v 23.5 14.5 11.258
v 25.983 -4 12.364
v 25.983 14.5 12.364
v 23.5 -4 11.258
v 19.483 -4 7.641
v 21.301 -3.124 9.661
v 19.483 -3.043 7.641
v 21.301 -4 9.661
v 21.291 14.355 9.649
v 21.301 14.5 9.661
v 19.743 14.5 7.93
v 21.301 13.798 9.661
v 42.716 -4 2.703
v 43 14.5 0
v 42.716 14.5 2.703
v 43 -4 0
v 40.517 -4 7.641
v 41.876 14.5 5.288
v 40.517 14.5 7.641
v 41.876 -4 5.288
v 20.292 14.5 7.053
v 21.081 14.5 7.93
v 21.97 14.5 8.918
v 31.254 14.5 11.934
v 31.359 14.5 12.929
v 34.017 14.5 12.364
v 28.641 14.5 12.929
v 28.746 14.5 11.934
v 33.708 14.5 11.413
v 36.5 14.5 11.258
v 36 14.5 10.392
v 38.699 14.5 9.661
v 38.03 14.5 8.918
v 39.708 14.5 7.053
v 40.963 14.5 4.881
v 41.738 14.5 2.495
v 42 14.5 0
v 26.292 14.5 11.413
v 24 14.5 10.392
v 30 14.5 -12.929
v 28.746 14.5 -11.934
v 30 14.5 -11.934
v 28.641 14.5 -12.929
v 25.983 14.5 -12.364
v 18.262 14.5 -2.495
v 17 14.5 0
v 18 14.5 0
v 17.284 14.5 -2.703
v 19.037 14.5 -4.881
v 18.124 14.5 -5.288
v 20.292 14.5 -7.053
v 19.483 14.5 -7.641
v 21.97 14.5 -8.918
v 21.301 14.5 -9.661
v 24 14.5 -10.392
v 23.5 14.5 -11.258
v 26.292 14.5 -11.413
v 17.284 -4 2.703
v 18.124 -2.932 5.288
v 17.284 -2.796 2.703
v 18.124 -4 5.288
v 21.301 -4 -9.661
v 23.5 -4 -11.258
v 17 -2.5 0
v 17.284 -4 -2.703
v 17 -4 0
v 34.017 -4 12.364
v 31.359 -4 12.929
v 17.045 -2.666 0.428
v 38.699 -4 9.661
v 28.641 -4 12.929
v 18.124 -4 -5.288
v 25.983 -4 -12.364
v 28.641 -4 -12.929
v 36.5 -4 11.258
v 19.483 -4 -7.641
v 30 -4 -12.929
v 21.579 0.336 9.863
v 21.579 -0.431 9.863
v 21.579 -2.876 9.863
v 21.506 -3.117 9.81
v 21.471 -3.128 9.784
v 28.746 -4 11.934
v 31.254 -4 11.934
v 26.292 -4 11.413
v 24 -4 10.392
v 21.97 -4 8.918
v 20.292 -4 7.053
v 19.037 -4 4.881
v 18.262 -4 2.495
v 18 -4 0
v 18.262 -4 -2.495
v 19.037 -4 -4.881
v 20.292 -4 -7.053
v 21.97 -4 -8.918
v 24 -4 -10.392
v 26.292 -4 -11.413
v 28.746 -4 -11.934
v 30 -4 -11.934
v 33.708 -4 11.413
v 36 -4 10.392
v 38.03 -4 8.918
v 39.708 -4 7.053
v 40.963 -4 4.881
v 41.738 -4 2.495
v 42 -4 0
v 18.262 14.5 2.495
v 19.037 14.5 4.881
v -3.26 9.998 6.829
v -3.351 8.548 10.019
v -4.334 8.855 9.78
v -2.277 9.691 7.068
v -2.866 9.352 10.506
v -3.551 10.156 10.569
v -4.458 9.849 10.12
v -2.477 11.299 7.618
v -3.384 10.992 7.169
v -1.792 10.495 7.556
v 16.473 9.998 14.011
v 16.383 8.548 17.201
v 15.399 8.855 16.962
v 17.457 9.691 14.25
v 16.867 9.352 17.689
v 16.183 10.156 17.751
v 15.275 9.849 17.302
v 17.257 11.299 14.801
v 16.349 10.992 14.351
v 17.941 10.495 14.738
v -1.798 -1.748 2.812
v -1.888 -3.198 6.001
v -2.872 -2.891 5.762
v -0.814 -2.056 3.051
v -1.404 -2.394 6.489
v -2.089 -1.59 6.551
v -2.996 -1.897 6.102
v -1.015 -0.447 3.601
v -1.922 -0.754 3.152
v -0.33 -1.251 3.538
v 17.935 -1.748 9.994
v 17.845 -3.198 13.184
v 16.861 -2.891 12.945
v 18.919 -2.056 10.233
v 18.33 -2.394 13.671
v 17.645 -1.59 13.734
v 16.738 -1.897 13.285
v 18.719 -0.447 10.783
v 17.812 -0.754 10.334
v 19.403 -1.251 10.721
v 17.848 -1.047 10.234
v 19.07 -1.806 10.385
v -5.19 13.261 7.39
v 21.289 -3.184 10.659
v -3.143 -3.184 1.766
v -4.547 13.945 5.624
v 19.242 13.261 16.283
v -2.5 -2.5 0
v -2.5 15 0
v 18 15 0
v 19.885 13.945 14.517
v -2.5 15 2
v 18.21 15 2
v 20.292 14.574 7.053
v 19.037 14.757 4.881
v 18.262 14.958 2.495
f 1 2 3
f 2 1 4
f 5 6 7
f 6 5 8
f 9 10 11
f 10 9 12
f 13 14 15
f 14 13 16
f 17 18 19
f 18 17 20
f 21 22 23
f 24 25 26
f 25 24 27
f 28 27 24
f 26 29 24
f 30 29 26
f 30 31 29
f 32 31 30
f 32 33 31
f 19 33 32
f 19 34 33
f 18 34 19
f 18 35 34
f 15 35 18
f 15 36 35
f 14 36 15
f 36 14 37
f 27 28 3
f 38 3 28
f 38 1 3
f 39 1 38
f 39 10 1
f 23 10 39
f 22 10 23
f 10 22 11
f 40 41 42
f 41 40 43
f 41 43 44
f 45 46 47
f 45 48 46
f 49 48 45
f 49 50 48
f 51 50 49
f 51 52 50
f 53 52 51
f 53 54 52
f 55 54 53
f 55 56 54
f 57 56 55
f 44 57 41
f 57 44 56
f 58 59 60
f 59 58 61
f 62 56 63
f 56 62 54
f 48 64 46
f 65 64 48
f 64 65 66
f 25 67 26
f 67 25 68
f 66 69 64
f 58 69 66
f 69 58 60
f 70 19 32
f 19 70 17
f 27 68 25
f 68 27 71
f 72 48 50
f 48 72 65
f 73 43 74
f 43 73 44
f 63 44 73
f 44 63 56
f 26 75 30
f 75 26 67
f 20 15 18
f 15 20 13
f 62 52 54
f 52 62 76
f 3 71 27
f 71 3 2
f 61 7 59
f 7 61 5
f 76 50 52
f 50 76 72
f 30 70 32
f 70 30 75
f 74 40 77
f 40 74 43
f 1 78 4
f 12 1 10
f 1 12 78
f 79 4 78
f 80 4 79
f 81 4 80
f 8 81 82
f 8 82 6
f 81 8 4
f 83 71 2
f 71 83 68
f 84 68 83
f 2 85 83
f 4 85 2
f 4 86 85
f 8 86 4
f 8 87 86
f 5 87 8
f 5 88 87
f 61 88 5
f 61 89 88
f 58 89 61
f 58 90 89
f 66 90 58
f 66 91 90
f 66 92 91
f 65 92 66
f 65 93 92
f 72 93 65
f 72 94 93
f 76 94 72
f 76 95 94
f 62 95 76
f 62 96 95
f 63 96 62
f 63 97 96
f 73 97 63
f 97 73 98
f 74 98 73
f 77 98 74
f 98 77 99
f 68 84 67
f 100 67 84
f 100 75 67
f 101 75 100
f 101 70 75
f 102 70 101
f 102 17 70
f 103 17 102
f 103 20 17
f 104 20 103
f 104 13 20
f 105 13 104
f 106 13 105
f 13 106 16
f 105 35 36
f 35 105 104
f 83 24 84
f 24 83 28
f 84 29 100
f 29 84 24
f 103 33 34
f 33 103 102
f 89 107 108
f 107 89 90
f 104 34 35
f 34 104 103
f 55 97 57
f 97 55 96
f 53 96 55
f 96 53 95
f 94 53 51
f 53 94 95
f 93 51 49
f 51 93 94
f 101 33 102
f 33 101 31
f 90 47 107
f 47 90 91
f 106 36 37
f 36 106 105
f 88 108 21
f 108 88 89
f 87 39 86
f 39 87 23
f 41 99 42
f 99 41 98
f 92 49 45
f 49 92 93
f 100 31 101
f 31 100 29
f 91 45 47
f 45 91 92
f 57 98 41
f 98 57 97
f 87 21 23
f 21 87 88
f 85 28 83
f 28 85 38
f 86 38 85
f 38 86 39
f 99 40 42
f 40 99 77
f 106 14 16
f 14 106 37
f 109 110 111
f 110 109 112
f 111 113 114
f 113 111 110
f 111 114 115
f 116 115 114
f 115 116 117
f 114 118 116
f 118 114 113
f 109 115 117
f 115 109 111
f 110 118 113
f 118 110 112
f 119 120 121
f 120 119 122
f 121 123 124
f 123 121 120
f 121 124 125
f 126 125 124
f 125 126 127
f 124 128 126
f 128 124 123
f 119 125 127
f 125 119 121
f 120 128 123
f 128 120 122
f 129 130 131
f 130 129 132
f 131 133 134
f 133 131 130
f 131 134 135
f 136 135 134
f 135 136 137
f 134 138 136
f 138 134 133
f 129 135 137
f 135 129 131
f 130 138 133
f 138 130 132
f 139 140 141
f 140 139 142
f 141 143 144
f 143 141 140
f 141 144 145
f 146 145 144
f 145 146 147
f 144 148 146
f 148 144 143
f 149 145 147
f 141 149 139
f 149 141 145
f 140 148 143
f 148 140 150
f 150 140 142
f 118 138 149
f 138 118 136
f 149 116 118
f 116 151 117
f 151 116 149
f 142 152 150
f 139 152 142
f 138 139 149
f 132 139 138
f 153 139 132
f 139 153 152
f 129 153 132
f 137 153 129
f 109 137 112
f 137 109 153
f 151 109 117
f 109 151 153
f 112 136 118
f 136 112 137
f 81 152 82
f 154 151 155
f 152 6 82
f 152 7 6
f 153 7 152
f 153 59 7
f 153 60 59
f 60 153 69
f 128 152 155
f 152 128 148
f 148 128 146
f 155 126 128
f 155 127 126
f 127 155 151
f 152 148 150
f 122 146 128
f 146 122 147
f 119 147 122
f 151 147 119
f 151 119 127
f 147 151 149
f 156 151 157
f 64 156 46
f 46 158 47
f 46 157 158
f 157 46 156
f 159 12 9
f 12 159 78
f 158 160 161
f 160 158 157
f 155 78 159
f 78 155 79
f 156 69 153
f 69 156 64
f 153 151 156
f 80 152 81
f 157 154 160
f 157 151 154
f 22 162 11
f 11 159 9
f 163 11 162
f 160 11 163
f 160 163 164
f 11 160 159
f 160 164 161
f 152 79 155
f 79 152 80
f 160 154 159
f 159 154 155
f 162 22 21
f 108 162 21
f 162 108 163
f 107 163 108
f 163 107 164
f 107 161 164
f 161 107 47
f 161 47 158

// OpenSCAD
wall_thickness = 6.2;
thickness = 2;
height_offset = 60;

right_rotation = 20;
down_rotation  = 20;


module camera_mount(){
rotate([down_rotation,-right_rotation,0])
translate([0,0,thickness]){

    cylinder(h=5, d=1.8);
    translate([21,0,0]) cylinder(h=5, d=1.8);

    translate([0,12.5,0]) {
        cylinder(h=5, d=1.8);
        translate([21,0,0]) cylinder(h=5, d=1.8);    
        }
}

    
    
translate([-5/2,-5/2,0]){
    hull() {
    rotate([down_rotation,-right_rotation,0]) cube([21+5, 12.5+5, 2]);
    cube([21+5, 12.5+5, 2]);
    }
    }
    
}
translate([30,-4,0])
rotate([-90,0,0])
difference(){
cylinder(12.5+6, 26/2, 26/2);
    
cylinder(12.5+6, 24/2, 24/2);
cube([100,100,100]);
}


difference(){
camera_mount();
    
translate([30,-4,0])
rotate([-90,0,0])
    cylinder(12.5+8, 24/2, 24/2);

}
